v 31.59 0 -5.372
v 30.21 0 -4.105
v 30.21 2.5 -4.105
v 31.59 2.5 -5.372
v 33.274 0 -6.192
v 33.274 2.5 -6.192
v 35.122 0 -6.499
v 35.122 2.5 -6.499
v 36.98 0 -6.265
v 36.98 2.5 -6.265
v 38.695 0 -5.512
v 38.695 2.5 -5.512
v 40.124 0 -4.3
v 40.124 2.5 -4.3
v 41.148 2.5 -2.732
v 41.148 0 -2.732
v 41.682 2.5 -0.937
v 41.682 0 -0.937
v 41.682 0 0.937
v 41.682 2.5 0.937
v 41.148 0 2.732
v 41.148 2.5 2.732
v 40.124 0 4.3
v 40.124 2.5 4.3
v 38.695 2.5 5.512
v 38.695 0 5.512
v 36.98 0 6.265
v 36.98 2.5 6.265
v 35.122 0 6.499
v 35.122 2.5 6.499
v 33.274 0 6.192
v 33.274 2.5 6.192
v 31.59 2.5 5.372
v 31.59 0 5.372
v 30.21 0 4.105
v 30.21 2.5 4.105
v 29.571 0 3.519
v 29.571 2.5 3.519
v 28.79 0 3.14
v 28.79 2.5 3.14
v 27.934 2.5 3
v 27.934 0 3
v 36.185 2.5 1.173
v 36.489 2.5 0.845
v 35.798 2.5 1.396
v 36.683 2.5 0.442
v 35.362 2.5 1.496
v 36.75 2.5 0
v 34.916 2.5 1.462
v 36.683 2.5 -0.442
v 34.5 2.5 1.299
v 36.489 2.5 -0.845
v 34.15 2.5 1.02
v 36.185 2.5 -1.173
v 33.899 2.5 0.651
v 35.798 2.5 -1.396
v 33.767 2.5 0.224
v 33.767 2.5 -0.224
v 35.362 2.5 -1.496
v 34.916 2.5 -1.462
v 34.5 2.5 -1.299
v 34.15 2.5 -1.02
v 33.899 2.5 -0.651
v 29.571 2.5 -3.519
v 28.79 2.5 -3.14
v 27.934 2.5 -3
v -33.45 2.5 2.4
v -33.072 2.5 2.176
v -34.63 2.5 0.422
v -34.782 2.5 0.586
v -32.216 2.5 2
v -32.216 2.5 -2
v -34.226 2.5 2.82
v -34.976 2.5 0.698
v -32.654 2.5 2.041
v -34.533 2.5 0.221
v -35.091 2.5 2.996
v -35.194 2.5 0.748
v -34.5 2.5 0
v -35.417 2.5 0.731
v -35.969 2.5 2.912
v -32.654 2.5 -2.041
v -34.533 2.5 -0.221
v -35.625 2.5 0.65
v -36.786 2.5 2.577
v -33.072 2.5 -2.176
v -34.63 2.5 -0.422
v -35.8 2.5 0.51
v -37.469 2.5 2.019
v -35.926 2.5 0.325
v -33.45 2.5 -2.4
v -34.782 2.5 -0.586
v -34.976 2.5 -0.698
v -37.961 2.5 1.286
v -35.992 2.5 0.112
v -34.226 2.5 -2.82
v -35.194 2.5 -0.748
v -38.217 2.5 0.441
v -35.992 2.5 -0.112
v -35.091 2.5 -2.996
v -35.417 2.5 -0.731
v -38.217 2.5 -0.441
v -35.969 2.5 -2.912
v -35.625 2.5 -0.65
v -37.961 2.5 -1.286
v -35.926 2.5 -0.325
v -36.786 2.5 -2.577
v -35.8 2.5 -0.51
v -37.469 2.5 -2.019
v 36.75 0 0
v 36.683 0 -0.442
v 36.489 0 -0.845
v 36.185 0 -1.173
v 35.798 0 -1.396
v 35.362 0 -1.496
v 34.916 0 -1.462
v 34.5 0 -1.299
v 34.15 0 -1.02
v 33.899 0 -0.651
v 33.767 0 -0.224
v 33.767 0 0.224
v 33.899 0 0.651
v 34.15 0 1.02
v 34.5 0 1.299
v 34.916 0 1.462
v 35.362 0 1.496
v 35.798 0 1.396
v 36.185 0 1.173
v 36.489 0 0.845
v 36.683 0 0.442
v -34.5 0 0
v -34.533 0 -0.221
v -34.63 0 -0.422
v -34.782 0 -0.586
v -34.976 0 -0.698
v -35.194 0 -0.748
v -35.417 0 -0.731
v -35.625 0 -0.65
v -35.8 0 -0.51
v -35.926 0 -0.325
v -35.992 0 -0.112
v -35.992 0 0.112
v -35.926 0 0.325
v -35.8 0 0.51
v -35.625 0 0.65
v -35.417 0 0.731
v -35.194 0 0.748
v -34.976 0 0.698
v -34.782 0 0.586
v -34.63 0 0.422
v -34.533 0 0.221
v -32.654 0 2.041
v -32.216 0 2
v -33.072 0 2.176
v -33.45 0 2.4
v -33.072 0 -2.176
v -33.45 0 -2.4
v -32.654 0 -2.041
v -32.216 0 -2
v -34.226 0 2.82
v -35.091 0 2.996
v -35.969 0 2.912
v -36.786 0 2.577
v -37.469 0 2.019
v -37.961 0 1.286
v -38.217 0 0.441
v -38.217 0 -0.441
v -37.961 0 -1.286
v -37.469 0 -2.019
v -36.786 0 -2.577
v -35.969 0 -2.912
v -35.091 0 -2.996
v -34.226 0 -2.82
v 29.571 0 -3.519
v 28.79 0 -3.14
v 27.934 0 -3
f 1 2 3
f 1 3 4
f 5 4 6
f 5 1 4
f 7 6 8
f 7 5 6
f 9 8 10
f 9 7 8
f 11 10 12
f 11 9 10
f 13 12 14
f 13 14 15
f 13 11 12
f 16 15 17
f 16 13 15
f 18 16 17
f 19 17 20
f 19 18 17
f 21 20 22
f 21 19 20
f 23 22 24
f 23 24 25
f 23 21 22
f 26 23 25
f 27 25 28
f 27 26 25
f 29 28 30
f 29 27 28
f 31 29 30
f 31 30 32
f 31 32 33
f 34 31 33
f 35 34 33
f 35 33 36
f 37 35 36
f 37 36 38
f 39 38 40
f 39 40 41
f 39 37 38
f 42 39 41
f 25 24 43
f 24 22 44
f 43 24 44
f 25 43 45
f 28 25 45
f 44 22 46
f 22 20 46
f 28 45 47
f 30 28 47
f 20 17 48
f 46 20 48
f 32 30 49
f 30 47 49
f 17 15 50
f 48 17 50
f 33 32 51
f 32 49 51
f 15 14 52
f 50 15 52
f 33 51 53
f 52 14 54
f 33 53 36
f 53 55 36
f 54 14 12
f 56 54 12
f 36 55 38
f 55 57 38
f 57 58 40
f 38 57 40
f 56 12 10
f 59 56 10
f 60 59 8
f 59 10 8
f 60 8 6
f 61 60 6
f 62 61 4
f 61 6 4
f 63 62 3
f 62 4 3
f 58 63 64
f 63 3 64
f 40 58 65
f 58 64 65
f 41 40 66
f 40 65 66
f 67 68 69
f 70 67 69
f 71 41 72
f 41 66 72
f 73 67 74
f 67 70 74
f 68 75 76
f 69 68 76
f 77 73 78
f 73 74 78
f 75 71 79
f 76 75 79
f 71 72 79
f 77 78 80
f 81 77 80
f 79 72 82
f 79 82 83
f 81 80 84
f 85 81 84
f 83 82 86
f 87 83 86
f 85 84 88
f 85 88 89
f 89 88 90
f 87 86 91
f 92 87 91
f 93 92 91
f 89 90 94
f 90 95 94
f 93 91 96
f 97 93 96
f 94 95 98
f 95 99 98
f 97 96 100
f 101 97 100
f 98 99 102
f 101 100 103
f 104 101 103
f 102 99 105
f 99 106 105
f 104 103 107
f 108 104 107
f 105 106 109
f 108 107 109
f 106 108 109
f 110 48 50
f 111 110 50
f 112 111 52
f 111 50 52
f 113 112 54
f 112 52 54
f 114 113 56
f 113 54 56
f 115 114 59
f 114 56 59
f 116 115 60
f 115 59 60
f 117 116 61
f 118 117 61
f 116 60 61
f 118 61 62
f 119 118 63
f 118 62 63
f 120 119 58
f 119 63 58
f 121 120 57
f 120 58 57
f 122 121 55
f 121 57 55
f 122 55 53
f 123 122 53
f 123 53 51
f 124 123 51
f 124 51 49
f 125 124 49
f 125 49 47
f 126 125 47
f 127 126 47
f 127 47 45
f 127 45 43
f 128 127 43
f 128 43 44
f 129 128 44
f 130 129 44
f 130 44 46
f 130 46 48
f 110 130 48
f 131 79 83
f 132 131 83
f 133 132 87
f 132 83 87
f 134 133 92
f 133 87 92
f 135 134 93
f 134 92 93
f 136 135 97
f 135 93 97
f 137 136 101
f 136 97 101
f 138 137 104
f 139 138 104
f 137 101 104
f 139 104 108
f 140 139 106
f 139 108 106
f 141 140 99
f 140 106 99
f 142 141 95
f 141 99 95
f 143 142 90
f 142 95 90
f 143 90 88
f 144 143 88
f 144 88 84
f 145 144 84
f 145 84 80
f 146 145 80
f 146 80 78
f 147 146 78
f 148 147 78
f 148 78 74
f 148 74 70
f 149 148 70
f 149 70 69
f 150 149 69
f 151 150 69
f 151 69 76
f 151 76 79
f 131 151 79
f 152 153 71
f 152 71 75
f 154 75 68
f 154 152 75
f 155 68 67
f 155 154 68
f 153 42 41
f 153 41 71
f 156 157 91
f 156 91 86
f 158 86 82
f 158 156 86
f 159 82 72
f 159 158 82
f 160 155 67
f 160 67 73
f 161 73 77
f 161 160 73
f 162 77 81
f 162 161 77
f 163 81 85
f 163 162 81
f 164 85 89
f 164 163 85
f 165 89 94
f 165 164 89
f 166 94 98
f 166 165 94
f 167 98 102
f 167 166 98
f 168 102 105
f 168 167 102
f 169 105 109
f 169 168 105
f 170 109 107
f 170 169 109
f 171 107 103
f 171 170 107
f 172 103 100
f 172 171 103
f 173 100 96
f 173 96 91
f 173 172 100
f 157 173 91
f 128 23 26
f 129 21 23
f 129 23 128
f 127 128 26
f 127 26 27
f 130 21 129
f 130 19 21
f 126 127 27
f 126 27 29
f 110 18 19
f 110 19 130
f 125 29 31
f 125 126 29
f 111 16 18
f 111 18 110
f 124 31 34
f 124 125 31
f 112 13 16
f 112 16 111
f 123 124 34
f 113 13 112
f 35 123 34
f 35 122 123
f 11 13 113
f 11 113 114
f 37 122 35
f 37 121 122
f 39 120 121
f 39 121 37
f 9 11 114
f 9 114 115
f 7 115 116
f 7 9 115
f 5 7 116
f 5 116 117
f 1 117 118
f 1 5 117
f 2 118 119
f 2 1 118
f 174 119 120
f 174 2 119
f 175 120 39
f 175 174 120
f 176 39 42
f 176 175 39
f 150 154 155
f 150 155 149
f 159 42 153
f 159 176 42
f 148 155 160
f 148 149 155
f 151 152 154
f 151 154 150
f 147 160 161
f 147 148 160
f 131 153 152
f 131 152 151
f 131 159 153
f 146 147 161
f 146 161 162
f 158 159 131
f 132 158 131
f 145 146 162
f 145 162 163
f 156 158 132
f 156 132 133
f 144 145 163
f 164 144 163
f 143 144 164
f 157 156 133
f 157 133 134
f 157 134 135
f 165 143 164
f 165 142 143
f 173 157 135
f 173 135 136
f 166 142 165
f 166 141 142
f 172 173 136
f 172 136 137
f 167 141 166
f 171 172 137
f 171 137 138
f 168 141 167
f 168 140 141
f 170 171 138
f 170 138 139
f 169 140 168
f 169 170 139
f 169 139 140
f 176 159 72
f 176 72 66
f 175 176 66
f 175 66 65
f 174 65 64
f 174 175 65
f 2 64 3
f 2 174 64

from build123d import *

# Parameters (mm, degrees)
BOSS_EXTRUDE1_DEPTH = 2.5
CUT_EXTRUDE1_REACH  = 4.5
SKETCH2_R           = 0.75
SKETCH2_R_2         = 1.5


with BuildPart() as part:
    # Sketch1 → Boss-Extrude1 (new body)
    with BuildSketch(Plane(origin=(0, 0, 0), x_dir=(1, 0, 0), z_dir=(0, 1, 0))):
        with BuildLine():
            Line((-32.216386231, 2), (27.934070474, 3))
            ThreePointArc((27.934070474, 3), (29.194347957, 3.300786008), (30.210243769, 4.104979553))
            ThreePointArc((30.210243769, 4.104979553), (41.75, 0), (30.210243769, -4.104979553))
            ThreePointArc((30.210243769, -4.104979553), (29.194347957, -3.300786008), (27.934070474, -3))
            Line((27.934070474, -3), (-32.216386231, -2))
            ThreePointArc((-32.216386231, -2), (-32.86638269, -2.097194277), (-33.449778955, -2.3998342))
            ThreePointArc((-33.449778955, -2.3998342), (-38.25, 0), (-33.449778955, 2.3998342))
            ThreePointArc((-33.449778955, 2.3998342), (-32.86638269, 2.097194277), (-32.216386231, 2))
        make_face()
    extrude(amount=BOSS_EXTRUDE1_DEPTH)

    # Sketch2 → Cut-Extrude1 (cut, up to next)
    with BuildSketch(Plane(origin=(0, 2.5, 0), x_dir=(1, 0, 0), z_dir=(0, 1, 0)), mode=Mode.PRIVATE) as cut_extrude1_sk1:
        with Locations((-35.25, 0)):
            Circle(SKETCH2_R)
    cut_extrude1_tool1 = extrude(cut_extrude1_sk1.sketch, amount=-CUT_EXTRUDE1_REACH, mode=Mode.PRIVATE) & part.part
    add(cut_extrude1_tool1.solids().sort_by_distance((-35.25, 2.5, 0))[0], mode=Mode.SUBTRACT)
    # Sketch2 → Cut-Extrude1 (cut, up to next)
    with BuildSketch(Plane(origin=(0, 2.5, 0), x_dir=(1, 0, 0), z_dir=(0, 1, 0)), mode=Mode.PRIVATE) as cut_extrude1_sk2:
        with Locations((35.25, 0)):
            Circle(SKETCH2_R_2)
    cut_extrude1_tool2 = extrude(cut_extrude1_sk2.sketch, amount=-CUT_EXTRUDE1_REACH, mode=Mode.PRIVATE) & part.part
    add(cut_extrude1_tool2.solids().sort_by_distance((35.25, 2.5, 0))[0], mode=Mode.SUBTRACT)


solid = part.part
